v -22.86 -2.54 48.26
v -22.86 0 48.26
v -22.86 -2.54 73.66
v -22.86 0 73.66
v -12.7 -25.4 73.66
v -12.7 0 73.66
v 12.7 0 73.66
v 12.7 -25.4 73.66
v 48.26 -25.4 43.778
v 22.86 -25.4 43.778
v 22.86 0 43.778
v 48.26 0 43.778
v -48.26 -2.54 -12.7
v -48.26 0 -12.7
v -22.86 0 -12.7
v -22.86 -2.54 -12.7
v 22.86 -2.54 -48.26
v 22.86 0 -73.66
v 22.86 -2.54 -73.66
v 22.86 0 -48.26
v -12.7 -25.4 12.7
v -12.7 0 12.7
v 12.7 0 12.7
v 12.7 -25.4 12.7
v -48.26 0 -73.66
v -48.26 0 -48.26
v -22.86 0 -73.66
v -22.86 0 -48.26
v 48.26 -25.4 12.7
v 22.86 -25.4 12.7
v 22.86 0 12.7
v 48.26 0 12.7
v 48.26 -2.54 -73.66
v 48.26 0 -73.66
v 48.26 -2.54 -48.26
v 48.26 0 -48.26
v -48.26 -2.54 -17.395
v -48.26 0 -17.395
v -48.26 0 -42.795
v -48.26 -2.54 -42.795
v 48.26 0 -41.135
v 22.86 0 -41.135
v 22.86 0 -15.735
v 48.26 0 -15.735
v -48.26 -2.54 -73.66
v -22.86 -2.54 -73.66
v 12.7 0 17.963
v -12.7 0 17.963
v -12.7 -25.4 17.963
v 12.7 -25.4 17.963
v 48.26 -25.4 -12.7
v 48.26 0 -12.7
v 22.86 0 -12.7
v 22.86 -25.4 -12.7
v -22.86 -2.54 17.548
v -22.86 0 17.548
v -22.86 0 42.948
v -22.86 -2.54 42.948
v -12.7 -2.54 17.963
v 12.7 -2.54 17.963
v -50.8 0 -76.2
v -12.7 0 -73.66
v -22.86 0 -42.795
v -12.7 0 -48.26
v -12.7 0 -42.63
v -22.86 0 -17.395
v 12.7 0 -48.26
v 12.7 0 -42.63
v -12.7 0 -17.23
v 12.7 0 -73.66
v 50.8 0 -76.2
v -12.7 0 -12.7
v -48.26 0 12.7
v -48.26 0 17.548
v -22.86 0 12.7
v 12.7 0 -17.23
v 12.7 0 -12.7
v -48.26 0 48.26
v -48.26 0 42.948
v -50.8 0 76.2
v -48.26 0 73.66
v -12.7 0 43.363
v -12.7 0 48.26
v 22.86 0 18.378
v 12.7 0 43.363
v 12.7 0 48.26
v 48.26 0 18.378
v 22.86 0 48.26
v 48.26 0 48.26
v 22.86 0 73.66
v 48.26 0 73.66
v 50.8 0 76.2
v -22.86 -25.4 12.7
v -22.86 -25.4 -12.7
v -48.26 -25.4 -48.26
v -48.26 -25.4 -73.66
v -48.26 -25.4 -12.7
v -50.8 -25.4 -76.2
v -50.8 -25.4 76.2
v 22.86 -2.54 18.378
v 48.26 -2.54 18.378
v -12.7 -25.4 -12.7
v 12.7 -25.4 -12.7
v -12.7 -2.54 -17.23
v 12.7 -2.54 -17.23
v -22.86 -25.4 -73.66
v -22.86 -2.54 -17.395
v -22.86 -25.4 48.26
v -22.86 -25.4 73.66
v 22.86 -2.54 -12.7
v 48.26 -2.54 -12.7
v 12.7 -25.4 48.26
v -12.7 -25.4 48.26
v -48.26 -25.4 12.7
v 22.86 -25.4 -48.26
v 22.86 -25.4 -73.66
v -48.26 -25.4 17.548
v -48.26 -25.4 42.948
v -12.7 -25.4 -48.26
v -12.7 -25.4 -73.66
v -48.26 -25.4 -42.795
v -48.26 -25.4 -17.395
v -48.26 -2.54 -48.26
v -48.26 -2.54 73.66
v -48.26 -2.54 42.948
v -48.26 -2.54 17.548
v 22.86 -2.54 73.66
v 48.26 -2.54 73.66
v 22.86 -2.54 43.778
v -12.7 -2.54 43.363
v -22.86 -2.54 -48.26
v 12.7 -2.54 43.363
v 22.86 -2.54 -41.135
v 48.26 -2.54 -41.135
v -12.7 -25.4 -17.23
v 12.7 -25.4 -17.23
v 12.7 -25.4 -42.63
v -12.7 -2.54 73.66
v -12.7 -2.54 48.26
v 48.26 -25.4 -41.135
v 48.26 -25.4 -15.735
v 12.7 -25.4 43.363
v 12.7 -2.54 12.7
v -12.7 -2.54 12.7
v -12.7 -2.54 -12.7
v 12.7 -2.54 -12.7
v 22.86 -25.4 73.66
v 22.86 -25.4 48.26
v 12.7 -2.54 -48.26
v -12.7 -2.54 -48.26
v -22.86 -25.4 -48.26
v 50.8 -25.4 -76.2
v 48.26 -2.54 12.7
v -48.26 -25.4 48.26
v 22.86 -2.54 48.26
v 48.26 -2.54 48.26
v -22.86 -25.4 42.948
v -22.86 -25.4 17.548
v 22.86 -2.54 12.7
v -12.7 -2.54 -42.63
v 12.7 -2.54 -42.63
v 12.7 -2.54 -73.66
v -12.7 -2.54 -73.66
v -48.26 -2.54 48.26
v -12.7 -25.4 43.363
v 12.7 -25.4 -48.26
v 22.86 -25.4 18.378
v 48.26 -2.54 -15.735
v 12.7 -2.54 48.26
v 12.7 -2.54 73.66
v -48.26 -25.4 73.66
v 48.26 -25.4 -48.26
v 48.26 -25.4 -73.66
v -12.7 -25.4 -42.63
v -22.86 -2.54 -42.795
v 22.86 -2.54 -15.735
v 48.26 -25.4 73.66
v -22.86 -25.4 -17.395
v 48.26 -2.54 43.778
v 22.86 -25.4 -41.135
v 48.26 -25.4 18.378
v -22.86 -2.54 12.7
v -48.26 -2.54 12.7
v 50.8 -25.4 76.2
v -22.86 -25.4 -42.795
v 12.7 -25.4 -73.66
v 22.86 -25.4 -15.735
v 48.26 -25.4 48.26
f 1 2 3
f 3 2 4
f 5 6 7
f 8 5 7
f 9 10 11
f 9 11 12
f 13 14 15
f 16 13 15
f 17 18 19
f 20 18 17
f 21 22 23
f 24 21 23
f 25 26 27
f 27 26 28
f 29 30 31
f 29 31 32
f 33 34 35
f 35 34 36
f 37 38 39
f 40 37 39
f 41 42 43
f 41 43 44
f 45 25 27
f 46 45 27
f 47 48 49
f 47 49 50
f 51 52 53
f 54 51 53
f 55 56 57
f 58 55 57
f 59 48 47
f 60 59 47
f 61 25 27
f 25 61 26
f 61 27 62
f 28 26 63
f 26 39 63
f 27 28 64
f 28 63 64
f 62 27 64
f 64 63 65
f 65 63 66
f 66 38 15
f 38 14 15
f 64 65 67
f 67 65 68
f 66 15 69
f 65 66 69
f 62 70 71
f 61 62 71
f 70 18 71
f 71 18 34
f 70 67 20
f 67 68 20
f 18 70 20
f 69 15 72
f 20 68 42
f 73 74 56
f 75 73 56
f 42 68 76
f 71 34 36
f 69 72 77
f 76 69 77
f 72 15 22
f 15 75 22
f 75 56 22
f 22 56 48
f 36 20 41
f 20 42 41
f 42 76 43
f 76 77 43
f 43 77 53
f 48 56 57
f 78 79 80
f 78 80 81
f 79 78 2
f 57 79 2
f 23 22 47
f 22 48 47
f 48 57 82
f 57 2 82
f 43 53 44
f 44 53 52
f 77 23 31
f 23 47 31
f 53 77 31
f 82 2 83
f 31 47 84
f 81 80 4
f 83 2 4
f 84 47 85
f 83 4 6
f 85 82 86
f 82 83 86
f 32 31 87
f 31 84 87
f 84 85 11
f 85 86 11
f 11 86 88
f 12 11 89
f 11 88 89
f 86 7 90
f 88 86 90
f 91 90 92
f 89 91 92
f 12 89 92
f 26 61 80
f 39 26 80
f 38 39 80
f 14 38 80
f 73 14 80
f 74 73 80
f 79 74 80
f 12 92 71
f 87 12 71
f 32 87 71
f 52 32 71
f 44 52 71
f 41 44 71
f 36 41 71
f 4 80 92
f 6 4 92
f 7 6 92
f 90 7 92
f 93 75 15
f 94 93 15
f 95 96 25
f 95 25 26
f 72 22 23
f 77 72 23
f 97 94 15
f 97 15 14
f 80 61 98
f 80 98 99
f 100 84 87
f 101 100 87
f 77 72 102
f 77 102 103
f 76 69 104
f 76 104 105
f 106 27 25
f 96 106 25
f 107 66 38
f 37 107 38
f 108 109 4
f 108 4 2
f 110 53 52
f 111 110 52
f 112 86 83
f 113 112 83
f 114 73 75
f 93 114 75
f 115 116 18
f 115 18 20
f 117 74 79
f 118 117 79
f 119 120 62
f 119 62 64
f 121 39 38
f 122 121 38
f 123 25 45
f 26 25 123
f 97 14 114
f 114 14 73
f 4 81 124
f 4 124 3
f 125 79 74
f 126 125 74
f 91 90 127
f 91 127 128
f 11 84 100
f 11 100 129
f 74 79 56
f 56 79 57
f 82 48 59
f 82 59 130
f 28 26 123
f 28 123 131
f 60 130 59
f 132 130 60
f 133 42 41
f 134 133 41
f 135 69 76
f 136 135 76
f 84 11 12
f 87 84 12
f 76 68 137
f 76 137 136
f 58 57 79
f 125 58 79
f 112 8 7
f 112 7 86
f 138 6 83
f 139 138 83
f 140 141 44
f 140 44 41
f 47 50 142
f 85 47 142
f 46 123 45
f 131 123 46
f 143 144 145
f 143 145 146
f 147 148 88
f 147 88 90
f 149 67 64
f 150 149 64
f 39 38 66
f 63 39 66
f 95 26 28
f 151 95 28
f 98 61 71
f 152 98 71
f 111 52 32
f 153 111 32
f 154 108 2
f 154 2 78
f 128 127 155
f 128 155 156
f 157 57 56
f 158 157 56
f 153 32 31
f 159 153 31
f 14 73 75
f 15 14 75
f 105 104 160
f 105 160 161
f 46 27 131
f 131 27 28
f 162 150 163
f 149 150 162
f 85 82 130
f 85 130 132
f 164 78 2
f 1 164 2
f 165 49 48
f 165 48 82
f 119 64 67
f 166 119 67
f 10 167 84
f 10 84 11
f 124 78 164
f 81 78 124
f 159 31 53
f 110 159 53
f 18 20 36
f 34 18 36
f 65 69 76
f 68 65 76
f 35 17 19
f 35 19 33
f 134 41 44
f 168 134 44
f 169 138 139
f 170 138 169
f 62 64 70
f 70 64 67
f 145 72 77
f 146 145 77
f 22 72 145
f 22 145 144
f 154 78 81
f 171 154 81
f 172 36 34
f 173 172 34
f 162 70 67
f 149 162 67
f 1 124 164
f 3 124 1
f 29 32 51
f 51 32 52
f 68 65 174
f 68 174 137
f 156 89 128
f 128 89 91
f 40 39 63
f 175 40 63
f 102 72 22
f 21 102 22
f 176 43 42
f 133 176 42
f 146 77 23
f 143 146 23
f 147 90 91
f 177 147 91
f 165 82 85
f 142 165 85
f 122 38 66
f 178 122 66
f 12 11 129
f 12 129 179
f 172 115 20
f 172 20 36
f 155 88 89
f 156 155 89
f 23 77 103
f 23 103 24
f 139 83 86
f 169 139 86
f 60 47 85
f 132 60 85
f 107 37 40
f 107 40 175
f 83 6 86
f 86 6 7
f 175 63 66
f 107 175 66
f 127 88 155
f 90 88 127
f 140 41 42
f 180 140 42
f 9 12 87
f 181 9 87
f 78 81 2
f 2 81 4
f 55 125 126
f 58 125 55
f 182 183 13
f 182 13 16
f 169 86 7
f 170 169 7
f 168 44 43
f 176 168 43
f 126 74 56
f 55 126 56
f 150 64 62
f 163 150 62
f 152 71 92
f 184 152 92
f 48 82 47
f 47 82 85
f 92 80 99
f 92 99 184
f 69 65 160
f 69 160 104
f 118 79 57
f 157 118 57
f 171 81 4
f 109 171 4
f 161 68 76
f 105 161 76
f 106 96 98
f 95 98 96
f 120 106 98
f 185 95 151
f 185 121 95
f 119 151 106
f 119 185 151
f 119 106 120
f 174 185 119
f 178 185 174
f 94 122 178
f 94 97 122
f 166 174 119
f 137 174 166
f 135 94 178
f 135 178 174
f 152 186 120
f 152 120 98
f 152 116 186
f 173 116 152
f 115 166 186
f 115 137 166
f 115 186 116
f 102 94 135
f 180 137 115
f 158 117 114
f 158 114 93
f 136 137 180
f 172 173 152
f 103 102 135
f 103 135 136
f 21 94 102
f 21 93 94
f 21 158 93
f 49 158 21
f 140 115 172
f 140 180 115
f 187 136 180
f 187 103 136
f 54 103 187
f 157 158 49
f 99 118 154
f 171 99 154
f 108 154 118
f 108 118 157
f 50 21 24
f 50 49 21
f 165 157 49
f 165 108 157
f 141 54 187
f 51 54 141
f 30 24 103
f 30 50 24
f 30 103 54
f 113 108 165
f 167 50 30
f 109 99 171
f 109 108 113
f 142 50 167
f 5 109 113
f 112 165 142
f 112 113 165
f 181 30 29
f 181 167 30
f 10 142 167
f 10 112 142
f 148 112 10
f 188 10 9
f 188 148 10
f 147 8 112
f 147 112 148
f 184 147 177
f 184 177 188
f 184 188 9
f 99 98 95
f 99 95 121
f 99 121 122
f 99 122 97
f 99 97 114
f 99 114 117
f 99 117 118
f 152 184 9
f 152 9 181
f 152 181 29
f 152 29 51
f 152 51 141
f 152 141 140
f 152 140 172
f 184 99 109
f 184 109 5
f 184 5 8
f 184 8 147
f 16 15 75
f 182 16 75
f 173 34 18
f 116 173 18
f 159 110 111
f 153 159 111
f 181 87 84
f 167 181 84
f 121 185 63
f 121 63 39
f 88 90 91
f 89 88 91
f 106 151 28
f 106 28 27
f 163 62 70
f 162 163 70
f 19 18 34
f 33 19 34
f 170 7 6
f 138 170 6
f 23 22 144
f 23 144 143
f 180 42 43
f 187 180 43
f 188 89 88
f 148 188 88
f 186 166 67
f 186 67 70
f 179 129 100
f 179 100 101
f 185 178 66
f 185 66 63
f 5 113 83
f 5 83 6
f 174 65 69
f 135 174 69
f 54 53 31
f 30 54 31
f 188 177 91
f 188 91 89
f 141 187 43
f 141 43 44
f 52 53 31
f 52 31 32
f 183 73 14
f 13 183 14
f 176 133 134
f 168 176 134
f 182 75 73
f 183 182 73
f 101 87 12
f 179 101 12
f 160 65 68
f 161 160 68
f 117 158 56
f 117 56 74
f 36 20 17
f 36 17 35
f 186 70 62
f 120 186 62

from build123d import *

# Parameters (mm, degrees)
F0_W     = 25.4
F0_H     = 25.4
F1_DEPTH = 2.54
F0_W_2   = 101.6
F0_H_2   = 152.4
F2_DEPTH = 25.4


with BuildPart() as f1:
    # F0 (on Front) → F1 (new body)
    with BuildSketch(Plane.XZ):
        with Locations((-35.56, 60.96)):
            Rectangle(F0_W, F0_H)
        Polygon((12.7, 48.26), (12.7, 73.66), (0, 73.66), (-12.7, 73.66), (-12.7, 48.26), align=None)
        with Locations((35.56, 60.96)):
            Rectangle(F0_W, F0_H)
        with Locations((35.56, 31.078152)):
            Rectangle(F0_W, F0_H)
        with Locations((0, 30.663133)):
            Rectangle(F0_W, F0_H)
        Polygon((-22.86, 42.948115), (-48.26, 42.948115), (-48.26, 30.248115), (-48.26, 17.548115), (-22.86, 17.548115), align=None)
        Polygon((-22.86, 12.7), (-48.26, 12.7), (-48.26, 0), (-48.26, -12.7), (-22.86, -12.7), align=None)
        Rectangle(F0_W, F0_H)
        Polygon((48.26, 0), (48.26, 12.7), (22.86, 12.7), (22.86, -12.7), (48.26, -12.7), align=None)
        Polygon((48.26, -28.43516), (48.26, -15.73516), (22.86, -15.73516), (22.86, -41.13516), (48.26, -41.13516), align=None)
        with Locations((0, -29.929649)):
            Rectangle(F0_W, F0_H)
        Polygon((-22.86, -17.395241), (-48.26, -17.395241), (-48.26, -30.095241), (-48.26, -42.795241), (-22.86, -42.795241), align=None)
        with Locations((-35.56, -60.96)):
            Rectangle(F0_W, F0_H)
        Polygon((0, -73.66), (12.7, -73.66), (12.7, -48.26), (-12.7, -48.26), (-12.7, -73.66), align=None)
        with Locations((35.56, -60.96)):
            Rectangle(F0_W, F0_H)
    extrude(amount=F1_DEPTH)


with BuildPart() as f2:
    # F0 (on Front) → F2 (new body)
    with BuildSketch(Plane.XZ):
        Rectangle(F0_W_2, F0_H_2)
        Polygon((22.86, 73.66), (48.26, 73.66), (48.26, 48.26), (48.26, 43.778152), (48.26, 18.378152), (48.26, 12.7), (48.26, 0), (48.26, -12.7), (48.26, -15.73516), (48.26, -28.43516), (48.26, -41.13516), (48.26, -48.26), (48.26, -73.66), (22.86, -73.66), (12.7, -73.66), (0, -73.66), (-12.7, -73.66), (-22.86, -73.66), (-48.26, -73.66), (-48.26, -48.26), (-48.26, -42.795241), (-48.26, -30.095241), (-48.26, -17.395241), (-48.26, -12.7), (-48.26, 0), (-48.26, 12.7), (-48.26, 17.548115), (-48.26, 30.248115), (-48.26, 42.948115), (-48.26, 48.26), (-48.26, 73.66), (-22.86, 73.66), (-12.7, 73.66), (0, 73.66), (12.7, 73.66), align=None, mode=Mode.SUBTRACT)
        Polygon((22.86, 48.26), (22.86, 73.66), (12.7, 73.66), (12.7, 48.26), (-12.7, 48.26), (-12.7, 73.66), (-22.86, 73.66), (-22.86, 48.26), (-48.26, 48.26), (-48.26, 42.948115), (-22.86, 42.948115), (-22.86, 17.548115), (-48.26, 17.548115), (-48.26, 12.7), (-22.86, 12.7), (-22.86, -12.7), (-48.26, -12.7), (-48.26, -17.395241), (-22.86, -17.395241), (-22.86, -42.795241), (-48.26, -42.795241), (-48.26, -48.26), (-22.86, -48.26), (-22.86, -73.66), (-12.7, -73.66), (-12.7, -48.26), (12.7, -48.26), (12.7, -73.66), (22.86, -73.66), (22.86, -48.26), (48.26, -48.26), (48.26, -41.13516), (22.86, -41.13516), (22.86, -15.73516), (48.26, -15.73516), (48.26, -12.7), (22.86, -12.7), (22.86, 12.7), (48.26, 12.7), (48.26, 18.378152), (22.86, 18.378152), (22.86, 43.778152), (48.26, 43.778152), (48.26, 48.26), align=None)
        with Locations((0, -29.929649)):
            Rectangle(F0_W, F0_H, mode=Mode.SUBTRACT)
        Rectangle(F0_W, F0_H, mode=Mode.SUBTRACT)
        with Locations((0, 30.663133)):
            Rectangle(F0_W, F0_H, mode=Mode.SUBTRACT)
    extrude(amount=F2_DEPTH)


solid = Compound([f1.part, f2.part])
